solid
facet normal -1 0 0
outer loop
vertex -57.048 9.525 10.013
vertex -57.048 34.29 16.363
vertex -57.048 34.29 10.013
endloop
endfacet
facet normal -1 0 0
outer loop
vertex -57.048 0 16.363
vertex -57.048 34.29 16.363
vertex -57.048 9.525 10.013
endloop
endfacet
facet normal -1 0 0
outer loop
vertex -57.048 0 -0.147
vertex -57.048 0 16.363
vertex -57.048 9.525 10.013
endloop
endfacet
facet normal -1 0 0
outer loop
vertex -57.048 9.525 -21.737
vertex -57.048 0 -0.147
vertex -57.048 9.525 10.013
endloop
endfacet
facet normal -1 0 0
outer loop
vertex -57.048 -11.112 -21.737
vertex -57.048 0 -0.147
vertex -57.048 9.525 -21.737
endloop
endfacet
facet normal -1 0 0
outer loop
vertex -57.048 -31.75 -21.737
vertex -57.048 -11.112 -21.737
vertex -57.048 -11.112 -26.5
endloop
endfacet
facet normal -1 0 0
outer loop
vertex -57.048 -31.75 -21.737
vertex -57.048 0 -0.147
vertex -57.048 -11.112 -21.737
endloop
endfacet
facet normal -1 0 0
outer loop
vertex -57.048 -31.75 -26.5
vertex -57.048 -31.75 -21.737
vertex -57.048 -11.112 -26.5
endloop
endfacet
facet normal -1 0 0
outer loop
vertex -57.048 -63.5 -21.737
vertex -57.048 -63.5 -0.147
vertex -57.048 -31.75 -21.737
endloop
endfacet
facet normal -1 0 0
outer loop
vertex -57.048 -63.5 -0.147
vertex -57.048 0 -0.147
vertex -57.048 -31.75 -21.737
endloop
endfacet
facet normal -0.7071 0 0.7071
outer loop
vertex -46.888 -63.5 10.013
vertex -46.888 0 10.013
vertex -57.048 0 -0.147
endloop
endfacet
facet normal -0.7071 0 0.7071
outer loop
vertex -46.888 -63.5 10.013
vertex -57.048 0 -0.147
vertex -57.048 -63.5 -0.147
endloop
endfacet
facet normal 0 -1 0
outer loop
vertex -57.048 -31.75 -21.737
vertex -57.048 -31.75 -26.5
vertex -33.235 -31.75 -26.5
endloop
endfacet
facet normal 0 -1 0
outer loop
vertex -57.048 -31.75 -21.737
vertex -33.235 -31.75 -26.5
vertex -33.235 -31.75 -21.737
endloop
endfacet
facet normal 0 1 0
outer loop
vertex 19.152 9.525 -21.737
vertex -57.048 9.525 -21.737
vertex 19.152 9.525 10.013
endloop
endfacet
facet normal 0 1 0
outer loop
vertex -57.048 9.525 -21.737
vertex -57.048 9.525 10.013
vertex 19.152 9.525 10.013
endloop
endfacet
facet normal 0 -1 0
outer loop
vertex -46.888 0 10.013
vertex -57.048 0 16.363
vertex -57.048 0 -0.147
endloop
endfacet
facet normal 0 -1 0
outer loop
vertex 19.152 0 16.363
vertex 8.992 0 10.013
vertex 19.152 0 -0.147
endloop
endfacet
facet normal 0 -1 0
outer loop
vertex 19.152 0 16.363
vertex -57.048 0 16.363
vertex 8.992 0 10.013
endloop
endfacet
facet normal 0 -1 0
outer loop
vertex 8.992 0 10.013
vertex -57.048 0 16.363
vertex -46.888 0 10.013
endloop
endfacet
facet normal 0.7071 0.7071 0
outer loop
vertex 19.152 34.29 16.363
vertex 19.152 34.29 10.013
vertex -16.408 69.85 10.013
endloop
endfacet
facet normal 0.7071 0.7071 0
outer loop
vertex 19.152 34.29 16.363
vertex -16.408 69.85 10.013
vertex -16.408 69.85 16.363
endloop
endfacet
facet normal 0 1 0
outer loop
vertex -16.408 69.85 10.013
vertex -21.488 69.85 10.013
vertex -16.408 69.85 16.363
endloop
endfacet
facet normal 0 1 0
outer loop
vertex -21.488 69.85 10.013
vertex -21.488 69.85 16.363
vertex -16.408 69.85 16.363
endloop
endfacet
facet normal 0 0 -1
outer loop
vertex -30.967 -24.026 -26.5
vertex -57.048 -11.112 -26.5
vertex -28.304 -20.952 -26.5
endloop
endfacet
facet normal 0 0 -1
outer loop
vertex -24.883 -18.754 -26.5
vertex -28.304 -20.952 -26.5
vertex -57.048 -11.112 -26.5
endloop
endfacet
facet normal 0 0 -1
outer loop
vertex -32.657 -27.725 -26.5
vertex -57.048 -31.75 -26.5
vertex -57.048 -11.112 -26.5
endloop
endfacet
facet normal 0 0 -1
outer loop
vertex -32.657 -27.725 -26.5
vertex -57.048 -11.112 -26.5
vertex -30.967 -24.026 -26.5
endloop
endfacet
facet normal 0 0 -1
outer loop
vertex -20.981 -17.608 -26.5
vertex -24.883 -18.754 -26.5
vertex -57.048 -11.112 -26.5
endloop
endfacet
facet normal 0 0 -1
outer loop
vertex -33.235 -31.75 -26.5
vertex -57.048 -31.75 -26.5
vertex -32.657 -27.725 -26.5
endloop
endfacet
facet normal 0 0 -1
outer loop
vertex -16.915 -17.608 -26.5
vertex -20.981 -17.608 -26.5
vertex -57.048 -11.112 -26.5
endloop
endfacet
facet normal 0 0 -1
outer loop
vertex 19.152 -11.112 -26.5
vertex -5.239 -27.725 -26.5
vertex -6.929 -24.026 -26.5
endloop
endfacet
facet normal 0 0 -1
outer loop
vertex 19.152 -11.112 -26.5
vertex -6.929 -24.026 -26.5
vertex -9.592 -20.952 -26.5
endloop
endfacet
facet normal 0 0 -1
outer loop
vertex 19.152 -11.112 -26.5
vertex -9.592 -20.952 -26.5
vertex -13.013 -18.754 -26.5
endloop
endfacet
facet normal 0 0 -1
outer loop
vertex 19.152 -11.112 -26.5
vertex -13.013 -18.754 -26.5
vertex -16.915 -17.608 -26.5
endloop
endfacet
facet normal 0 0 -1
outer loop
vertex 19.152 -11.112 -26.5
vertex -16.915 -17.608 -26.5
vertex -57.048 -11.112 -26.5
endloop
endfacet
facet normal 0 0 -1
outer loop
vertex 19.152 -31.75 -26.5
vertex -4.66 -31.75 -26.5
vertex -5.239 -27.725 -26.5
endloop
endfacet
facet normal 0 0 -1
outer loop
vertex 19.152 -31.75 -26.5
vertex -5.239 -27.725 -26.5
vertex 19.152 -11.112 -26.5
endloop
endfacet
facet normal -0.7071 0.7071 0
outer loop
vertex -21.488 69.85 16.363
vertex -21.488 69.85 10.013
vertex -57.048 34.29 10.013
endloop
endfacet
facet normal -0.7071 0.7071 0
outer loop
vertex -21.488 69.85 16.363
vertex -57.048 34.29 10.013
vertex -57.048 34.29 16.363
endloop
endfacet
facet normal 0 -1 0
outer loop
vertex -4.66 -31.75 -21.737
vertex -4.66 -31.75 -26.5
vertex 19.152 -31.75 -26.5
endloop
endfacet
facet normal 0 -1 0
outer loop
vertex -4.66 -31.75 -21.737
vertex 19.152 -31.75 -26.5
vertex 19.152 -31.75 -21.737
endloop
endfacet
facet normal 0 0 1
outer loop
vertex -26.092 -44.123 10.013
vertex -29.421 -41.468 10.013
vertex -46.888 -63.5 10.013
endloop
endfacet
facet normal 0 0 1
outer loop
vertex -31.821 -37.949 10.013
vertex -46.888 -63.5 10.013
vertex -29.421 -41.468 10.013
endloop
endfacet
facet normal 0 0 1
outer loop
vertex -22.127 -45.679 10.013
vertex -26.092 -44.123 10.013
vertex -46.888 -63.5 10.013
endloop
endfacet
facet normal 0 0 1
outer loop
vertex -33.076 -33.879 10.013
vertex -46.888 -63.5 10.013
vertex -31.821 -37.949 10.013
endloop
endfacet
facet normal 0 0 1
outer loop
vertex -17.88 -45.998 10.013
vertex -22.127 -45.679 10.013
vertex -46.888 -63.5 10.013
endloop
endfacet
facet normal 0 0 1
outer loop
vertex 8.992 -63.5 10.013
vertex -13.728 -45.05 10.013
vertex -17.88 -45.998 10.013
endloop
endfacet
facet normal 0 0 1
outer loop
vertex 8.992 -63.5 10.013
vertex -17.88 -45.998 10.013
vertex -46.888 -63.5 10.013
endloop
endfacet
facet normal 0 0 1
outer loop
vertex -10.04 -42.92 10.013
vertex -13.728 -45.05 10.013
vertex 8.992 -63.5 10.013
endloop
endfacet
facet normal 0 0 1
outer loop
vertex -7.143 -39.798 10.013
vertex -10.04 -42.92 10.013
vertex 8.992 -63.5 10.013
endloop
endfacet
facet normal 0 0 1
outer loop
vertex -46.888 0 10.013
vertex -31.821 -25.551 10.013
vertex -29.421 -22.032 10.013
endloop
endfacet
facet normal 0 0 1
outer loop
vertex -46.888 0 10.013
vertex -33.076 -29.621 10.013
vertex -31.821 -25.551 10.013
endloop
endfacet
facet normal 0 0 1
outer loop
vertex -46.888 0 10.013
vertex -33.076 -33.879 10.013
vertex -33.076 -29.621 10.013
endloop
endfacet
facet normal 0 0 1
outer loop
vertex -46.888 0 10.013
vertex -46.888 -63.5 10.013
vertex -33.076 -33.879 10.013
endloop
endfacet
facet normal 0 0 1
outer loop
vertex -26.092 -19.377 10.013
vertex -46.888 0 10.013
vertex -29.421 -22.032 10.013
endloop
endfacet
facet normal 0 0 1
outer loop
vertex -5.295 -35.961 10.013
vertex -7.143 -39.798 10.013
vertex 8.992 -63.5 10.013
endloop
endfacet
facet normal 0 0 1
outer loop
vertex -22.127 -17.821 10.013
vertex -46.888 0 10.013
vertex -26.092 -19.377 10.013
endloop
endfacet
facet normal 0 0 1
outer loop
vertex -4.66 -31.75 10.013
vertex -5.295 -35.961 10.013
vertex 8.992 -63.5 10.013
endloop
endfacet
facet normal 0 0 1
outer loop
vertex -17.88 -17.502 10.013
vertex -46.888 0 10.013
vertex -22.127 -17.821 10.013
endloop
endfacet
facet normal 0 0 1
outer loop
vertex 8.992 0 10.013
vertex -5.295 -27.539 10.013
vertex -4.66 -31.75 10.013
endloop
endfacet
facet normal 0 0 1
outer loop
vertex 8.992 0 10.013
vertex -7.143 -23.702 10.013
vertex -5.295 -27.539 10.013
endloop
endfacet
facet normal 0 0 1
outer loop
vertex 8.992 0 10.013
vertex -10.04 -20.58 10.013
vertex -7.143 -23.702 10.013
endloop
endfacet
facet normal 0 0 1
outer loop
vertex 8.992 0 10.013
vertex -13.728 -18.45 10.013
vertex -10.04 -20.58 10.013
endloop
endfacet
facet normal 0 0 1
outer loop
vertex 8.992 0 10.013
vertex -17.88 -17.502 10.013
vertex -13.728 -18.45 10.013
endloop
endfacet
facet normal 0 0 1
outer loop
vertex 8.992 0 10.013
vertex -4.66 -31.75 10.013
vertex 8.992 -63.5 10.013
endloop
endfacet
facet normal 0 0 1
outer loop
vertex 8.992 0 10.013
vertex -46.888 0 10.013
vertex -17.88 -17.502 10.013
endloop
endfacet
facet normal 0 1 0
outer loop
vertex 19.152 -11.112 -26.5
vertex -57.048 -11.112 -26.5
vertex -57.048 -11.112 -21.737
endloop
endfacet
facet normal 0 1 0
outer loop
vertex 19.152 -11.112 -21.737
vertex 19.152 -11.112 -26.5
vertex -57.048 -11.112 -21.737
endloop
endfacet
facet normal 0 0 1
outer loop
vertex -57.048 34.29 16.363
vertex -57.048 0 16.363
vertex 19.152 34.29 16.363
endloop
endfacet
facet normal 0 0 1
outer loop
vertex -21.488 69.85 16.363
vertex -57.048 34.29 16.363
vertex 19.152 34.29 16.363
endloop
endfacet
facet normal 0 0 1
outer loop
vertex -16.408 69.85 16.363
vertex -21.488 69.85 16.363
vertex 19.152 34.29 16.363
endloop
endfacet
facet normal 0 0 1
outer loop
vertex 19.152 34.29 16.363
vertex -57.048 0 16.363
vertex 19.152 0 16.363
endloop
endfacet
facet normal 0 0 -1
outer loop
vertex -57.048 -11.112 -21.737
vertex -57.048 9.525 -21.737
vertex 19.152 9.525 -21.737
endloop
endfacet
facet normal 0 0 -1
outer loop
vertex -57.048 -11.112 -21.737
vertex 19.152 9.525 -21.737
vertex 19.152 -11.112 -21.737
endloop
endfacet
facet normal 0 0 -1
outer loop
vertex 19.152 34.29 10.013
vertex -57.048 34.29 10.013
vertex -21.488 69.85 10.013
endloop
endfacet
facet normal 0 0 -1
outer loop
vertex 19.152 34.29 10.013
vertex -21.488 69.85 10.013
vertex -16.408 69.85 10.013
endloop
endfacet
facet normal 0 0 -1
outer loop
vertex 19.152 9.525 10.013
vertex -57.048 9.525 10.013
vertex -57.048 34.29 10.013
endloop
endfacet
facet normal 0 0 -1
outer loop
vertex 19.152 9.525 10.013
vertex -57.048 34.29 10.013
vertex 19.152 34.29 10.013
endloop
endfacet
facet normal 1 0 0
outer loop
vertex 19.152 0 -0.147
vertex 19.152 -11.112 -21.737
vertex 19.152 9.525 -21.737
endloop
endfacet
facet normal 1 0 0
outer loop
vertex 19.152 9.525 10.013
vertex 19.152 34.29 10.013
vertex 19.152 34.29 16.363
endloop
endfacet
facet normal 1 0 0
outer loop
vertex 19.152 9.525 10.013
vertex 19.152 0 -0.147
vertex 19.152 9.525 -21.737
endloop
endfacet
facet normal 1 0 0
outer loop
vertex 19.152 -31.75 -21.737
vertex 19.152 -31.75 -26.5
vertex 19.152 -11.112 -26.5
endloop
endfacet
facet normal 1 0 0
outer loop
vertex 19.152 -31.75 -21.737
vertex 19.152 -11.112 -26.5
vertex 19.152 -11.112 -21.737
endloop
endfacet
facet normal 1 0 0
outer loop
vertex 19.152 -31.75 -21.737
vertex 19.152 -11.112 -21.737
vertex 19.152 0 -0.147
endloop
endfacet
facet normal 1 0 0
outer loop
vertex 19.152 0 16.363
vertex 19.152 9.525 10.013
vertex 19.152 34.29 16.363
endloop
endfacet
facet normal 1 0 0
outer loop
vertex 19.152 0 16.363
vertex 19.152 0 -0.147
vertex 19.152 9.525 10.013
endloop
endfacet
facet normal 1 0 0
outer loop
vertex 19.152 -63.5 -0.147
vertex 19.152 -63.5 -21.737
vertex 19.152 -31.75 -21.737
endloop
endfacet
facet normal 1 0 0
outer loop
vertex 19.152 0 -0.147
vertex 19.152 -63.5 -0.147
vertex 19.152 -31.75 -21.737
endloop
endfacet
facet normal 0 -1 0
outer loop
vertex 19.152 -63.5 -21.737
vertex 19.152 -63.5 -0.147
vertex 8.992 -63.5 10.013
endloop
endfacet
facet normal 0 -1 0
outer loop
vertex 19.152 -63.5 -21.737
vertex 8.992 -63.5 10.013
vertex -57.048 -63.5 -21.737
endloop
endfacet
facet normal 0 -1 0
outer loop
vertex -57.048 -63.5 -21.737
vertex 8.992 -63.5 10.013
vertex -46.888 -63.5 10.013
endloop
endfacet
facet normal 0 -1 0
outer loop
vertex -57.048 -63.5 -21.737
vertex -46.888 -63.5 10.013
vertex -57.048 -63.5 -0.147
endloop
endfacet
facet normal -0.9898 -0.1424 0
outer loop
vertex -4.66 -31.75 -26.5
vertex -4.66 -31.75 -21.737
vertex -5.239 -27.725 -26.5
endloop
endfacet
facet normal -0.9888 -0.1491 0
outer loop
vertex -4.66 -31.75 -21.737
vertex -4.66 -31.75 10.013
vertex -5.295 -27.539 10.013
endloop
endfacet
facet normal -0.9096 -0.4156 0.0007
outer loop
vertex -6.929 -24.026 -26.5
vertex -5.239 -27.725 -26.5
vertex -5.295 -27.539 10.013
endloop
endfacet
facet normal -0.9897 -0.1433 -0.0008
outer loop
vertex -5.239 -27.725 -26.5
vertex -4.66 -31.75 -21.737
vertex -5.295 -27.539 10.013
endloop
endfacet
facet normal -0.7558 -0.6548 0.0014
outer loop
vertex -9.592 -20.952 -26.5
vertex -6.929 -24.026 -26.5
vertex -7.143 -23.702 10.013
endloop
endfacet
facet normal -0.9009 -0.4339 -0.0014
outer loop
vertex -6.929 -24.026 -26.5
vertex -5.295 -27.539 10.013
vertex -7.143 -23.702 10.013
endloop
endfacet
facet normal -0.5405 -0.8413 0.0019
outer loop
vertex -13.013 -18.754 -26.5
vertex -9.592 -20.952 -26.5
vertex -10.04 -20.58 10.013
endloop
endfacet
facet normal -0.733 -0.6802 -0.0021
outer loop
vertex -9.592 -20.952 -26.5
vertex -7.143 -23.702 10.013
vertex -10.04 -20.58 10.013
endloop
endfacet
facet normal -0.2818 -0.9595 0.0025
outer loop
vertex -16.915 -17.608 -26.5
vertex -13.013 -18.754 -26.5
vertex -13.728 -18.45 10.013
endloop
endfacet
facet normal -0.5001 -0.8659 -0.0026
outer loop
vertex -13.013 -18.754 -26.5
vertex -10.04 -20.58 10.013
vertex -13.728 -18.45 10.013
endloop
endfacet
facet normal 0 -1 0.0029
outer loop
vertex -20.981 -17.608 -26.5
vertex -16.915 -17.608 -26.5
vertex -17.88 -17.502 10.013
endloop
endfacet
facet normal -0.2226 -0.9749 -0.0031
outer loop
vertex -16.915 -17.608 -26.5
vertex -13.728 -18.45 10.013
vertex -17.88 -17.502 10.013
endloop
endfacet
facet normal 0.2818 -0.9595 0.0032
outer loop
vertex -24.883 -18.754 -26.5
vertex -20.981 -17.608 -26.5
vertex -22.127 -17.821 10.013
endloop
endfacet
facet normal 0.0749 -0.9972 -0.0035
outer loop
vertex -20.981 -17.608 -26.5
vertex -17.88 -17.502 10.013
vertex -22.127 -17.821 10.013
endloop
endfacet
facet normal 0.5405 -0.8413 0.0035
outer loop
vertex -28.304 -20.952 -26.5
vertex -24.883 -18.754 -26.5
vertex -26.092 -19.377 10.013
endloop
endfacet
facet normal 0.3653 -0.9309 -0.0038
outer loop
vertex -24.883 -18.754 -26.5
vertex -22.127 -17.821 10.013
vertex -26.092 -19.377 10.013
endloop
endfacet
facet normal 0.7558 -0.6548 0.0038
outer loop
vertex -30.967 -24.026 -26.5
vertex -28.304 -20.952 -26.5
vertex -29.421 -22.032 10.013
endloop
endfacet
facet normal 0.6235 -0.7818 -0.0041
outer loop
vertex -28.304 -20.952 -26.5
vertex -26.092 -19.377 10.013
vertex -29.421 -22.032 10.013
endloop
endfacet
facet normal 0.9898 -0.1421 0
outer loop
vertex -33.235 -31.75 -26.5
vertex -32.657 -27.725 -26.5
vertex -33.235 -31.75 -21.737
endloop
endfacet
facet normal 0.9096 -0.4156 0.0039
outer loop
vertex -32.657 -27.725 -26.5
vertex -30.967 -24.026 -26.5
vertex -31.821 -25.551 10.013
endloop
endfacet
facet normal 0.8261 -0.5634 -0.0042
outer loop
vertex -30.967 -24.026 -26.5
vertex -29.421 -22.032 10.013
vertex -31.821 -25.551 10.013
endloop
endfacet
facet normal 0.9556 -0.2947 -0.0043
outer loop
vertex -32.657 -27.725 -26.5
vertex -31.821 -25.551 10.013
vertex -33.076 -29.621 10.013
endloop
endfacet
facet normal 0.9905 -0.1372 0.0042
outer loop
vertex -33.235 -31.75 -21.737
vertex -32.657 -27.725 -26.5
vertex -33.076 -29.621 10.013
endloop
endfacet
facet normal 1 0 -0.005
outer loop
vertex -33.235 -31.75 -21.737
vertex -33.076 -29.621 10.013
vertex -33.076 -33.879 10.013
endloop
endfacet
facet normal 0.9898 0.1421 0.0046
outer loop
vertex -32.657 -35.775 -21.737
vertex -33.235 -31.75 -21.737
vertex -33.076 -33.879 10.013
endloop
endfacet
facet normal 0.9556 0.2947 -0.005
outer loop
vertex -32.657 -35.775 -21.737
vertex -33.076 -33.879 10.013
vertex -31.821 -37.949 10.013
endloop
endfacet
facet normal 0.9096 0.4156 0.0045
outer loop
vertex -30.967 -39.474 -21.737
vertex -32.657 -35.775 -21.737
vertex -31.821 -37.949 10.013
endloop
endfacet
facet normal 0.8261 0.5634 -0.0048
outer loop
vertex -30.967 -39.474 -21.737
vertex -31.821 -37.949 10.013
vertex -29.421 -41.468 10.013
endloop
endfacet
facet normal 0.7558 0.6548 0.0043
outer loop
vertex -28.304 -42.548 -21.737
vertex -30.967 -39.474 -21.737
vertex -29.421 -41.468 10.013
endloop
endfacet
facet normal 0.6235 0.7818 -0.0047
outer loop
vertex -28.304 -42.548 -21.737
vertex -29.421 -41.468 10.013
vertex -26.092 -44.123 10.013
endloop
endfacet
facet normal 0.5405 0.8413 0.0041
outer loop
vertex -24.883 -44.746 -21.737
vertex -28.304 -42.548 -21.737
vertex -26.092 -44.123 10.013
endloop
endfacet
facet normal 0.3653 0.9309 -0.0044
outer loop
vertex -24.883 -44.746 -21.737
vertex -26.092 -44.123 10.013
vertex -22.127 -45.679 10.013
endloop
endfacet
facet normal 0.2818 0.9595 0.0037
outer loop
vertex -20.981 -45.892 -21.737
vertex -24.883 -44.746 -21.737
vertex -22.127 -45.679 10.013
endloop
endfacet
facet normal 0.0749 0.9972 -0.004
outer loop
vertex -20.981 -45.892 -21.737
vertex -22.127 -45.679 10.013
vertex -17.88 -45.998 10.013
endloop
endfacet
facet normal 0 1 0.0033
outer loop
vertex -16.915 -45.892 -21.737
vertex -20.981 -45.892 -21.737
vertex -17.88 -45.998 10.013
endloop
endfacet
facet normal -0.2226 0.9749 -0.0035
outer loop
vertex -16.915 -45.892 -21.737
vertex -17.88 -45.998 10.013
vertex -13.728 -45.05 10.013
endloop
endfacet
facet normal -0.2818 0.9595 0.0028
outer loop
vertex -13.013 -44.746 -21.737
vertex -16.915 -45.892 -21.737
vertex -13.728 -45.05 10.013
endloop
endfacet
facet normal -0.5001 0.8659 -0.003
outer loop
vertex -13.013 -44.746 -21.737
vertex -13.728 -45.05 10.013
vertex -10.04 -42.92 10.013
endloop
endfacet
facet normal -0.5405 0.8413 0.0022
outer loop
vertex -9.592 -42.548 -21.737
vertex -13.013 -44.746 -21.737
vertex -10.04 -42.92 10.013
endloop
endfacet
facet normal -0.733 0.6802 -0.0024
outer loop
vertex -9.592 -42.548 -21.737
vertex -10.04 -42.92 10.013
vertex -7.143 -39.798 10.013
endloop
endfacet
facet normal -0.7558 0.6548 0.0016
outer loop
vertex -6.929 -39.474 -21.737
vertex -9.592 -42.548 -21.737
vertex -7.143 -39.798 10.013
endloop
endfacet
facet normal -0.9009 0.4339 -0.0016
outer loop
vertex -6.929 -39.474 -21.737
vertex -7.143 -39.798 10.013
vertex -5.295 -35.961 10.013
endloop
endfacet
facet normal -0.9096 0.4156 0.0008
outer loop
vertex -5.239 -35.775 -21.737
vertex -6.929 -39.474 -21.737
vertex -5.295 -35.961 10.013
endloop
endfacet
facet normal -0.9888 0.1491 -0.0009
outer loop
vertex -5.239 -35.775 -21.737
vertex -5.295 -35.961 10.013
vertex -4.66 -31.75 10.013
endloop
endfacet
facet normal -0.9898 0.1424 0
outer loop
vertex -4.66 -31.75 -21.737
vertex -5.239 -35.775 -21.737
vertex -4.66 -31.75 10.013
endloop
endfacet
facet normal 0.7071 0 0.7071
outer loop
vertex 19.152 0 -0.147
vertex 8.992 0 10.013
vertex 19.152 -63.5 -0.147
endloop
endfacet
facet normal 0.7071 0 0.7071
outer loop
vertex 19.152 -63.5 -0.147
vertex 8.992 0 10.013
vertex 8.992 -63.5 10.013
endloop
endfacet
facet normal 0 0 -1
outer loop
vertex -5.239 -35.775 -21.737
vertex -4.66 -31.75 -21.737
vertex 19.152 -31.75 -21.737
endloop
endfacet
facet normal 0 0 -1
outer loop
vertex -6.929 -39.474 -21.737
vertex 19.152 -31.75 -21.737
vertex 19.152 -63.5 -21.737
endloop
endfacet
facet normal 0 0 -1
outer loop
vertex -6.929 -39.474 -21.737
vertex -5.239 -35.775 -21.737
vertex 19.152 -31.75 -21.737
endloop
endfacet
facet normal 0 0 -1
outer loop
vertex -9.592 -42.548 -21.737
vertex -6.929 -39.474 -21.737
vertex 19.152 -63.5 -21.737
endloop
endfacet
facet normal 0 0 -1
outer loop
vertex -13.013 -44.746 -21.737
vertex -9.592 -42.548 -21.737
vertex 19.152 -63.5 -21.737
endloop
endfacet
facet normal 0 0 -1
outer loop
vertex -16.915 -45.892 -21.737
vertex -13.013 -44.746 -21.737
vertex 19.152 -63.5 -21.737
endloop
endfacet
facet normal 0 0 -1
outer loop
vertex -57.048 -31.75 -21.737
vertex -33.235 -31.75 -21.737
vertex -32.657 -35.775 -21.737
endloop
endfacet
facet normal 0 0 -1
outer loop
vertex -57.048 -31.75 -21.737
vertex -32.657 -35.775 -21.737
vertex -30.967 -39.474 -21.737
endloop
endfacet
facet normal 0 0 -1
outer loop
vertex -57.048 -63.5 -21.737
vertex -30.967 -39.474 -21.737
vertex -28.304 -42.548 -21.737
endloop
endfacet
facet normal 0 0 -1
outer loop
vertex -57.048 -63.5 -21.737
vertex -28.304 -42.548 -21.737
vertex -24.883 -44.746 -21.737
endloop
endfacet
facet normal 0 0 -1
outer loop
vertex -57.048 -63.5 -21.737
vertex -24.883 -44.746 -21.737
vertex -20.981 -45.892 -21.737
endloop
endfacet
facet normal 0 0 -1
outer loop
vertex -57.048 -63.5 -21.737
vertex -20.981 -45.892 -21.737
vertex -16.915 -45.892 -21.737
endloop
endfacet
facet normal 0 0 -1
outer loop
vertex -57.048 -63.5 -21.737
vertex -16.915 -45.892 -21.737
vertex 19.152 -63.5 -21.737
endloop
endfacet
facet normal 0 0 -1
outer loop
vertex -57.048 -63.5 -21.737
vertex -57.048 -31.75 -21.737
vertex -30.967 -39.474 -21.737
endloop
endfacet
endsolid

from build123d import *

# Parameters (mm, degrees)
F0_W      = 76.2
F0_H      = 31.75
F0_H_2    = 4.7625
F1_DEPTH  = 133.35
F2_SIZE   = 10.16
F0_H_3    = 6.35
F3_DEPTH  = 9.525
F4_DEPTH  = 69.85
F6_DEPTH  = 51.308
F7_SIZE2  = 35.56
F7_SIZE   = 35.56
F8_R      = 14.2875
F9_DEPTH  = 39.116
F10_DEPTH = 9.525
F11_W     = 20.6375
F11_H     = 4.7625
F11_W_2   = 31.75
F12_DEPTH = 84.836


with BuildPart() as f1:
    # F0 (on Front) → F1 (new body)
    with BuildSketch(Plane.XZ):
        with Locations((-18.9479482412, -5.8624097556)):
            Rectangle(F0_W, F0_H)
        with Locations((-18.9479482412, -24.1186597556)):
            Rectangle(F0_W, F0_H_2)
    extrude(amount=F1_DEPTH)

    # F2
    f2_edges = [f1.edges().sort_by_distance(p)[0] for p in [
        (19.152052, -66.675, 10.01259),
        (-57.047948, -66.675, 10.01259),
    ]]
    chamfer(f2_edges, length=F2_SIZE)

    # F0 (on Front) → F3 (join)
    with BuildSketch(Plane.XZ):
        with Locations((-18.9479482412, -5.8624097556)):
            Rectangle(F0_W, F0_H)
        with Locations((-18.9479482412, 13.1875902444)):
            Rectangle(F0_W, F0_H_3)
    extrude(amount=-F3_DEPTH)

    # F0 (on Front) → F4 (join)
    with BuildSketch(Plane.XZ):
        with Locations((-18.9479482412, 13.1875902444)):
            Rectangle(F0_W, F0_H_3)
    extrude(amount=-F4_DEPTH)

    # F5 (on face) → F6 (cut)
    with BuildSketch(Plane.XY.offset(10.0125902444)):
        Polygon((8.9920517588, -63.5), (-46.8879482412, -63.5), (-73.6699253321, -63.5), (-73.6699253321, -133.35), (35.7825346291, -133.35), (35.7825346291, -63.5), align=None)
    extrude(amount=-F6_DEPTH, mode=Mode.SUBTRACT)

    # F7
    f7_edges = [f1.edges().sort_by_distance(p)[0] for p in [
        (-57.047948, 69.85, 13.18759),
        (19.152052, 69.85, 13.18759),
    ]]
    chamfer(f7_edges, length=F7_SIZE, length2=F7_SIZE2)

    # F8 (on face) → F9 (cut)
    with BuildSketch(Plane.XY.offset(10.0125902444)):
        with Locations((-18.9479482412, -31.75)):
            Circle(F8_R)
    extrude(amount=-F9_DEPTH, mode=Mode.SUBTRACT)

    # F10 (add): a face of the model
    f10_faces = [f1.faces().sort_by_distance(p)[0] for p in [
        (-18.9479482412, 0, -24.1186597556),
    ]]
    extrude(f10_faces, amount=F10_DEPTH)

    # F11 (on face) → F12 (cut)
    with BuildSketch(Plane(origin=(-57.0479482412, 0, 0), x_dir=(0, -1, 0), z_dir=(-1, 0, 0))):
        with Locations((0.79375, -24.1186597556)):
            Rectangle(F11_W, F11_H)
        with Locations((47.625, -24.1186597556)):
            Rectangle(F11_W_2, F11_H)
    extrude(amount=-F12_DEPTH, mode=Mode.SUBTRACT)


solid = f1.part
